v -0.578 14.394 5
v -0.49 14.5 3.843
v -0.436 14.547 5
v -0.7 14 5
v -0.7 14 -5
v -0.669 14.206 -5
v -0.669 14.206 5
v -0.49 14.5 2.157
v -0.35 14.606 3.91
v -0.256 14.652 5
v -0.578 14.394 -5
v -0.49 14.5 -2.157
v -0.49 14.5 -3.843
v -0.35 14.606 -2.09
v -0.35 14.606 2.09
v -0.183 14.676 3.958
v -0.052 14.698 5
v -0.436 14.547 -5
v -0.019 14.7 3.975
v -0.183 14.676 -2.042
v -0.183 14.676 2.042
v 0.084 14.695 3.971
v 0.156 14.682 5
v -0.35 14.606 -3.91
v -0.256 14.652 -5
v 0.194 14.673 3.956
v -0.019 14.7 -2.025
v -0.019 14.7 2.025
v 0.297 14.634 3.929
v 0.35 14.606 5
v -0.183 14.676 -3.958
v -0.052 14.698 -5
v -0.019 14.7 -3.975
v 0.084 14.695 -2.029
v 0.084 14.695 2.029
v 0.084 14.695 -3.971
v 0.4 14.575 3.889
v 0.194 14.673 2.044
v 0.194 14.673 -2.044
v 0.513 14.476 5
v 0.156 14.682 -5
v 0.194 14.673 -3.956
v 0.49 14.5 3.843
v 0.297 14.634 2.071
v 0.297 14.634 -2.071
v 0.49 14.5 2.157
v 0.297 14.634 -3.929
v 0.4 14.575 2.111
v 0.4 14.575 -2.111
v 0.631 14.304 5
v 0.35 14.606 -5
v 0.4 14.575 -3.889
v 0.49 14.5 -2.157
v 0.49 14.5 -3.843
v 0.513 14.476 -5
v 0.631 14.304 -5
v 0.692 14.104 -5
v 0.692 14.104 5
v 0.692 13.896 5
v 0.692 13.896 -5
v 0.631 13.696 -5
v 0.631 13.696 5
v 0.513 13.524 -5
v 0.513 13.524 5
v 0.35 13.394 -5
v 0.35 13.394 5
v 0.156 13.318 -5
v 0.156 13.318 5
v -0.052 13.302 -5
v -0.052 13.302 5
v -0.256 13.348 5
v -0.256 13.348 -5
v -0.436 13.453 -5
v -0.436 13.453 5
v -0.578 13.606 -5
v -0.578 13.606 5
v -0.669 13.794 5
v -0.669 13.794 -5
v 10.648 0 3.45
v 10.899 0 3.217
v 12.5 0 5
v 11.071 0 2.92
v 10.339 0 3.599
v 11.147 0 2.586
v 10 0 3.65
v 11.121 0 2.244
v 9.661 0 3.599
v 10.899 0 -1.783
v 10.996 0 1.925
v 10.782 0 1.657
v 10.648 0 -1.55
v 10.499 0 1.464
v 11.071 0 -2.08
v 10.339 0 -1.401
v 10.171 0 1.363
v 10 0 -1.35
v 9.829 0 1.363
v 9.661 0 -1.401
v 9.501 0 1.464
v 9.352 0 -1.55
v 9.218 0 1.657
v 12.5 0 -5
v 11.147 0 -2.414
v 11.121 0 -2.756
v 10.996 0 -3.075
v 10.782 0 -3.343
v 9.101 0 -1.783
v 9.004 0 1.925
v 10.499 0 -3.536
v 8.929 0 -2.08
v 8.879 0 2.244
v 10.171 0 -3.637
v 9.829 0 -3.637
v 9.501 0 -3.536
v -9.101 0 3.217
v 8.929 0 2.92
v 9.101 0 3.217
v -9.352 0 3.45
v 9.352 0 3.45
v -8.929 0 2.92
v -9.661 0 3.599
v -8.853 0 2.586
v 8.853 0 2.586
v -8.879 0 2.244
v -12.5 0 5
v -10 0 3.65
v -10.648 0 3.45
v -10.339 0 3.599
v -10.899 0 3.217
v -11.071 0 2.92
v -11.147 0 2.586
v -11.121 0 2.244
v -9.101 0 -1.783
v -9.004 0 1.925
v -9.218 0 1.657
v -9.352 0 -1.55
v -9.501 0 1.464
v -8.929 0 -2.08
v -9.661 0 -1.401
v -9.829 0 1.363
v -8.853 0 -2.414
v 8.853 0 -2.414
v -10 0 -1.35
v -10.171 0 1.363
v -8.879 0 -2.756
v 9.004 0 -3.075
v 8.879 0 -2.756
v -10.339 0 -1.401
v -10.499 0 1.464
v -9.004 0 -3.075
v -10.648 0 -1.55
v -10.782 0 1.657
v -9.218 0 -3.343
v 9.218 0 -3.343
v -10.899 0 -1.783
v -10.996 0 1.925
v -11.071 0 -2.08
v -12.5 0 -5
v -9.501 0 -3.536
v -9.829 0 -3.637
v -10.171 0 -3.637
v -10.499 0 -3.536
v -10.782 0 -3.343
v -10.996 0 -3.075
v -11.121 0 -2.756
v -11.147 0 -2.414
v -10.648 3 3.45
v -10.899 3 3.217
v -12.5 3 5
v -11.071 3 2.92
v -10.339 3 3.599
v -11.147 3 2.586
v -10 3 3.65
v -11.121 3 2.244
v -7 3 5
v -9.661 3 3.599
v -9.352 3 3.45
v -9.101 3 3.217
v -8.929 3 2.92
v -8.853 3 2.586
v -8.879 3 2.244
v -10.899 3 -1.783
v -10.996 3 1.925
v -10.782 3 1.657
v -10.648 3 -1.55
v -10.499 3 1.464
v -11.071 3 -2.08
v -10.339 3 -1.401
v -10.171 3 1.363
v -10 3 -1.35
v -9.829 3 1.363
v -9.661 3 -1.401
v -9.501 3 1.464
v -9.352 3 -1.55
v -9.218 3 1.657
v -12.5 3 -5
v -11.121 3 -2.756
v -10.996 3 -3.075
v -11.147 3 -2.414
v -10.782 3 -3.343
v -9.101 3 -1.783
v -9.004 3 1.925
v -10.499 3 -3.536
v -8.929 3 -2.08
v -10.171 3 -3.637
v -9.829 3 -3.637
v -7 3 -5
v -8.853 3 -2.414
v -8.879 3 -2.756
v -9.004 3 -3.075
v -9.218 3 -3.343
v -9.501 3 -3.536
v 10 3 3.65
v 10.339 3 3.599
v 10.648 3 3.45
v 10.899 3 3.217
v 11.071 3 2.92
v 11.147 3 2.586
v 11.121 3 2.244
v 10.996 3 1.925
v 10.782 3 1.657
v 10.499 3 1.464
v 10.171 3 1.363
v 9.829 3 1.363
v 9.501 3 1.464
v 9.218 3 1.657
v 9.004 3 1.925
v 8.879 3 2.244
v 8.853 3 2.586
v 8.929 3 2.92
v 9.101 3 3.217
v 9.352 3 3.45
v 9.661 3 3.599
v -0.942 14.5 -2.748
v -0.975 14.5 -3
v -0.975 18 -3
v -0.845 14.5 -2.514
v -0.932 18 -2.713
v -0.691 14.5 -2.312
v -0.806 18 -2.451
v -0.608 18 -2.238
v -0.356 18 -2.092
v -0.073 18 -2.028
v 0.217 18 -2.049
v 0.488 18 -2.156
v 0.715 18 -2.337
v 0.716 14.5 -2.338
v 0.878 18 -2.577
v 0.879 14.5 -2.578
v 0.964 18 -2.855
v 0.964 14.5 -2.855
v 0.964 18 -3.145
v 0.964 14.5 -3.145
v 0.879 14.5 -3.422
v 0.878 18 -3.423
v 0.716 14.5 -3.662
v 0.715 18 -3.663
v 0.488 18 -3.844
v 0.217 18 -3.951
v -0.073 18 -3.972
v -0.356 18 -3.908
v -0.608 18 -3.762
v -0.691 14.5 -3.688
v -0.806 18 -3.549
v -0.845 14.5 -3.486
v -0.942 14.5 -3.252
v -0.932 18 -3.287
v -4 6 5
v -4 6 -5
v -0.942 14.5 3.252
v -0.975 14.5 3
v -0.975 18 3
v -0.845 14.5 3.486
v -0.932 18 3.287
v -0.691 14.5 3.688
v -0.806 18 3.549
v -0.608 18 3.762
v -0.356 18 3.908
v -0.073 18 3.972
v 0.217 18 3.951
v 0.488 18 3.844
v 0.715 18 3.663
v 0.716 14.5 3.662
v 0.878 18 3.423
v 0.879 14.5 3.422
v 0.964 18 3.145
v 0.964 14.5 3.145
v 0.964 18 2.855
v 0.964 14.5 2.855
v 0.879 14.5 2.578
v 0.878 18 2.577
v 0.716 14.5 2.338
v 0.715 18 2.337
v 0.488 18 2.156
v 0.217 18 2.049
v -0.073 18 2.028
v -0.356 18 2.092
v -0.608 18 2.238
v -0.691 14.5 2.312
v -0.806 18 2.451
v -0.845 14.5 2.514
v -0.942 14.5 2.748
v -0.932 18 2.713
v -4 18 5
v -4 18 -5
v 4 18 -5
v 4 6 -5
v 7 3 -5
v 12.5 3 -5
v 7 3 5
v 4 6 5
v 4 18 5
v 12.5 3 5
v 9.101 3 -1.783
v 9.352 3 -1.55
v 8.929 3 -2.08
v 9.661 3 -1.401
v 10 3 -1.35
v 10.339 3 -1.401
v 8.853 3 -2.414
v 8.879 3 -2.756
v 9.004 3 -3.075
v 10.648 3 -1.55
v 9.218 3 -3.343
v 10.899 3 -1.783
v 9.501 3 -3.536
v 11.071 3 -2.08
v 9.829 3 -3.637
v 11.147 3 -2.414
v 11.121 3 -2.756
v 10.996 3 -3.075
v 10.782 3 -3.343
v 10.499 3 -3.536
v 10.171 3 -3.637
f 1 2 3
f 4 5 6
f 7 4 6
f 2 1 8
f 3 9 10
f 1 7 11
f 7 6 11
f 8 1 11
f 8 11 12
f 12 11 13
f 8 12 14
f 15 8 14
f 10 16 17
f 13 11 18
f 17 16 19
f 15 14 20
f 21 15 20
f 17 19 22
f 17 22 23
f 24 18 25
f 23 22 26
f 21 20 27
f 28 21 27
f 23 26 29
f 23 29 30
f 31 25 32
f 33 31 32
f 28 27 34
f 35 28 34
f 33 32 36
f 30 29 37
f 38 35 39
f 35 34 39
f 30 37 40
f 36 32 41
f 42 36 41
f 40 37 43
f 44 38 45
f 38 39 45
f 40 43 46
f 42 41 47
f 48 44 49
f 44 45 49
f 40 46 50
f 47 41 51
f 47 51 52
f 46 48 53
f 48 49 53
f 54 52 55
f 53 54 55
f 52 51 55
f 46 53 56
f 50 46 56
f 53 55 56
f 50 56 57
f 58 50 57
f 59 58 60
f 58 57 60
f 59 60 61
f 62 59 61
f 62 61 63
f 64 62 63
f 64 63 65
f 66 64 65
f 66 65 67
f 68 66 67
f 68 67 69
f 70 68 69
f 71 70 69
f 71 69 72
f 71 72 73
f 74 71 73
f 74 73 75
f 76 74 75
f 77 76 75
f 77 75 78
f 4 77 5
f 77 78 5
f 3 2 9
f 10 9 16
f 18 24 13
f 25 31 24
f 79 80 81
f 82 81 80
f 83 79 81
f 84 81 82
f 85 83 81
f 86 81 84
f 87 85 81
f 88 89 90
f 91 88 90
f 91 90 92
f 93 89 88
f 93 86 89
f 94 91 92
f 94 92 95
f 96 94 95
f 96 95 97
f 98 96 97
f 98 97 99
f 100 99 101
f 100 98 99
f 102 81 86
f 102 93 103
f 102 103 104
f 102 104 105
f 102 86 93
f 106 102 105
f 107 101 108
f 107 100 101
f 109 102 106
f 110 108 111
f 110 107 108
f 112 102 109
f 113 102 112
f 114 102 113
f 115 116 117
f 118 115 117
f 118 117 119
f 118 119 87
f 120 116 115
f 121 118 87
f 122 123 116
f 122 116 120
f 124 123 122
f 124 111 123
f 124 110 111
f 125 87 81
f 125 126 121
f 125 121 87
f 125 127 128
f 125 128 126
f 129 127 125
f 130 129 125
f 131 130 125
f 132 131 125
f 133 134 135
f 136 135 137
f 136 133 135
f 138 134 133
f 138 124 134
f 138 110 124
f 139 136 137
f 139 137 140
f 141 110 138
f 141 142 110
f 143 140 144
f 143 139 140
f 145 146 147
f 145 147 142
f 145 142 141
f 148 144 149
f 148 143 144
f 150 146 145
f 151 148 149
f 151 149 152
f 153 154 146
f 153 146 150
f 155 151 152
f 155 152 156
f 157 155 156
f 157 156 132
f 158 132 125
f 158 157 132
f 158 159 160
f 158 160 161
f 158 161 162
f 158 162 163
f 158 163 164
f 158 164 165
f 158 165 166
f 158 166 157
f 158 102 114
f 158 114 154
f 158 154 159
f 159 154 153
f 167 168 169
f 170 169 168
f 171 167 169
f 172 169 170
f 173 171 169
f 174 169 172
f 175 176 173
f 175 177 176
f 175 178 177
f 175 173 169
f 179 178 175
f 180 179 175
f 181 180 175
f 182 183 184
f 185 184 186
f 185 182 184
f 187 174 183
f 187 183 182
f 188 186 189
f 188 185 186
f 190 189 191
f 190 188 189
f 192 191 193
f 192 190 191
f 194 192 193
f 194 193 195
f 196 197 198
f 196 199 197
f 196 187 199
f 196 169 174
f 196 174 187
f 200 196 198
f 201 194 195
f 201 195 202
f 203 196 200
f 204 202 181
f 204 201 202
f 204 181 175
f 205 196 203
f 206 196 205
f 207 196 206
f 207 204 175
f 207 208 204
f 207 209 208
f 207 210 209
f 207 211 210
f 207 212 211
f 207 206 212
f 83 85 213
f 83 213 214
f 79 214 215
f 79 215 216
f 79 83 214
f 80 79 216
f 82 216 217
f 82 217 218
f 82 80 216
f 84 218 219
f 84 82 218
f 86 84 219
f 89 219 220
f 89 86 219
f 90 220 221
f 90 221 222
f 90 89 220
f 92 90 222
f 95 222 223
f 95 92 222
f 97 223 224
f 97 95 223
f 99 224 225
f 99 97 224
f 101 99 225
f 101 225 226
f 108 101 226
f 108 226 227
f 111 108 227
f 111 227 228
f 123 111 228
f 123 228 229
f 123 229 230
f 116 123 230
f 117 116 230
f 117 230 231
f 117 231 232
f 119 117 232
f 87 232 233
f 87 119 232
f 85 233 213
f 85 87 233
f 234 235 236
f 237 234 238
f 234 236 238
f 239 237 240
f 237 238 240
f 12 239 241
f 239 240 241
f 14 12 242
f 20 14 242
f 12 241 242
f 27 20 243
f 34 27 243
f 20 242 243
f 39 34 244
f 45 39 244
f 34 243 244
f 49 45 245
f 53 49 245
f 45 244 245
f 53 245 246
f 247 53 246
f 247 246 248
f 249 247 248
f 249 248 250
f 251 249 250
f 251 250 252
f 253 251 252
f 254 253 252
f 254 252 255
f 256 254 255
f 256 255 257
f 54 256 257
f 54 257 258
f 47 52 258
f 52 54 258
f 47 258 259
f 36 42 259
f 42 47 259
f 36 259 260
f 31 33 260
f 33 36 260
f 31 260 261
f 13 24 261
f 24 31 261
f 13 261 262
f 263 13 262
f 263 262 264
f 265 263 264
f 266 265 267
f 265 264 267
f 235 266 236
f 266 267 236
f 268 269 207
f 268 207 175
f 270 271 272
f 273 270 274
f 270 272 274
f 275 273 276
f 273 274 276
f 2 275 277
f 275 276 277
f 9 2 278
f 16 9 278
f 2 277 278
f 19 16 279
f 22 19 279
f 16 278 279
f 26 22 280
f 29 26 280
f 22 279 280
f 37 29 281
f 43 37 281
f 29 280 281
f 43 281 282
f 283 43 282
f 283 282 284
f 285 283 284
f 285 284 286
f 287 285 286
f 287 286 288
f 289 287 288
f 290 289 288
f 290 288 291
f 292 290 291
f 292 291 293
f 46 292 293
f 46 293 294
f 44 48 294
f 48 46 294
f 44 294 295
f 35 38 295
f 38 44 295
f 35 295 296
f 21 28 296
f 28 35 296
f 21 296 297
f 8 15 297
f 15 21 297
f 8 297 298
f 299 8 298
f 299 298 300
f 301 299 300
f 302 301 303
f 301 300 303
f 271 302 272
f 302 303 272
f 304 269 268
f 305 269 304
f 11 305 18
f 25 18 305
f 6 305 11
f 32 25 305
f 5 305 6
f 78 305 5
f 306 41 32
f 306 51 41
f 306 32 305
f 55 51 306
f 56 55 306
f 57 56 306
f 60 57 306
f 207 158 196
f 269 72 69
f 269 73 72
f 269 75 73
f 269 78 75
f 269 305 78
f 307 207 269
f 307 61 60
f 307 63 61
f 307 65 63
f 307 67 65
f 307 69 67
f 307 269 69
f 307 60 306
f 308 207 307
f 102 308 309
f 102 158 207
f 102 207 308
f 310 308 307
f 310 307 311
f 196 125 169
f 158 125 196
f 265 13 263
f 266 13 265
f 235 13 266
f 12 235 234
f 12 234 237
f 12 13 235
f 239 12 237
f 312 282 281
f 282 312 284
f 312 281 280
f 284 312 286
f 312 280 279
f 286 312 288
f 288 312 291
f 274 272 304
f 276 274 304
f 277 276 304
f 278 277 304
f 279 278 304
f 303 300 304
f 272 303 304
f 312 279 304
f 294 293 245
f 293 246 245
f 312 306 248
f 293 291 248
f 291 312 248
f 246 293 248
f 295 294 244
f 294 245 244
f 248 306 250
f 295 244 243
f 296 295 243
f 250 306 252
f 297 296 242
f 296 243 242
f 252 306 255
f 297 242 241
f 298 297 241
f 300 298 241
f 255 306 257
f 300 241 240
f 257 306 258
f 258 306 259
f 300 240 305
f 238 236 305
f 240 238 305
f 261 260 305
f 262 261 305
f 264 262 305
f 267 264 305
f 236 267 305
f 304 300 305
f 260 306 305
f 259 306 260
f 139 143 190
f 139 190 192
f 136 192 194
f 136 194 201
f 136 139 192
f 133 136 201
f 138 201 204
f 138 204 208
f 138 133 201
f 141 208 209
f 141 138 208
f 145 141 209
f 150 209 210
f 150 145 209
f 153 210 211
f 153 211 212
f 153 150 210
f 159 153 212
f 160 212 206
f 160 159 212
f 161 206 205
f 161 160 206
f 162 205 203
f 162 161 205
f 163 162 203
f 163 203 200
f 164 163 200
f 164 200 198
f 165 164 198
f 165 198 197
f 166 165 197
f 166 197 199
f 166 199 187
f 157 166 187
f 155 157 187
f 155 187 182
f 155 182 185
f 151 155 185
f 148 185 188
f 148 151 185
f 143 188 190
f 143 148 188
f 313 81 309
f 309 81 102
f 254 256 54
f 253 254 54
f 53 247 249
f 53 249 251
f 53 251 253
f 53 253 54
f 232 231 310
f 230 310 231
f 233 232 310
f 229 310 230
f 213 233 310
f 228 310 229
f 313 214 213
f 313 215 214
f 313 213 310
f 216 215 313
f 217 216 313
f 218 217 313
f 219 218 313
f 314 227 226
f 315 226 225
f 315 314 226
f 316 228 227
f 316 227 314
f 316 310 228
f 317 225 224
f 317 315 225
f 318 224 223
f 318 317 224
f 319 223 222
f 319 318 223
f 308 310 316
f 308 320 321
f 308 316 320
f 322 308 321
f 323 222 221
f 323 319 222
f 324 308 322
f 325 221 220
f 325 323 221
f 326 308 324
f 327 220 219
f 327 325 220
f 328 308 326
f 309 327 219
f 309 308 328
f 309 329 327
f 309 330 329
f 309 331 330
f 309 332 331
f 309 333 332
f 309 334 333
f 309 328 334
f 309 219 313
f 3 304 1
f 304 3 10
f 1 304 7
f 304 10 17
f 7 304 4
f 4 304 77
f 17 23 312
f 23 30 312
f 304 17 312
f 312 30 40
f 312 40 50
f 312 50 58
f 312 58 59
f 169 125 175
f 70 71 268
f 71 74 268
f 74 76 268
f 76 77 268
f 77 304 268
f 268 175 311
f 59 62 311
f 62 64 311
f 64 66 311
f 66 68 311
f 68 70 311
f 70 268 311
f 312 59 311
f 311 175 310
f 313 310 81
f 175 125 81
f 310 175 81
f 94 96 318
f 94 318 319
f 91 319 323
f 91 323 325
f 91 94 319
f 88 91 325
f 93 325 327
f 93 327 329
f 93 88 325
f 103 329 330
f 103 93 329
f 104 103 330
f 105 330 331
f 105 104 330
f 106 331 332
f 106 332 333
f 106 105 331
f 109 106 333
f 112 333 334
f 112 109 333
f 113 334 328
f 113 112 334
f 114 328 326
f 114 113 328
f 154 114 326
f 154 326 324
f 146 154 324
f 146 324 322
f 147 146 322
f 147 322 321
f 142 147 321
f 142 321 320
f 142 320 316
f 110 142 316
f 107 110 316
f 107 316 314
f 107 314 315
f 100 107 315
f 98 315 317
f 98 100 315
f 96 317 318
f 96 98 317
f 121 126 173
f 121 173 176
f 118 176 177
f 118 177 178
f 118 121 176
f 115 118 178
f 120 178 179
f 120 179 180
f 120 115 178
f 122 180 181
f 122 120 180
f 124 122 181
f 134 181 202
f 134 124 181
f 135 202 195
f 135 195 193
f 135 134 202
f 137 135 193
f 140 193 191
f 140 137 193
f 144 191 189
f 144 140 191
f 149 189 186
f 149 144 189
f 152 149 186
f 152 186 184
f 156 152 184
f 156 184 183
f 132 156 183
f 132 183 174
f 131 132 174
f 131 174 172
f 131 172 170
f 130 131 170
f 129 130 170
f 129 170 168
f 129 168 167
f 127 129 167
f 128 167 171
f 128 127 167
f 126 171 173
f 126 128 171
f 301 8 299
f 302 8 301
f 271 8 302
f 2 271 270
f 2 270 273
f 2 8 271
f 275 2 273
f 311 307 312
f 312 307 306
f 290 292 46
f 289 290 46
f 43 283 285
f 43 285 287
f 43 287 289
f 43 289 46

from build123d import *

# Parameters (mm, degrees)
SKETCH1_W           = 25
SKETCH1_H           = 10
SKETCH1_R           = 1.15
BOSS_EXTRUDE1_DEPTH = 3
SKETCH3_W           = 8
SKETCH3_H           = 18
SKETCH3_R           = 0.7
BOSS_EXTRUDE2_DEPTH = 10
SKETCH5_R           = 0.975
CUT_EXTRUDE2_DEPTH  = 3.5
CHAMFER1_SIZE       = 3


with BuildPart() as part:
    # Sketch1 → Boss-Extrude1 (new body)
    with BuildSketch(Plane(origin=(0, 0, 0), x_dir=(1, 0, 0), z_dir=(0, 1, 0))):
        Rectangle(SKETCH1_W, SKETCH1_H)
        with Locations(Location((-10, 2.5, 0), (0, 0, 270))):
            Circle(SKETCH1_R, mode=Mode.SUBTRACT)
        with Locations(Location((-10, -2.5, 0), (0, 0, 270))):
            Circle(SKETCH1_R, mode=Mode.SUBTRACT)
        with Locations(Location((10, 2.5, 0), (0, 0, 270))):
            Circle(SKETCH1_R, mode=Mode.SUBTRACT)
        with Locations(Location((10, -2.5, 0), (0, 0, 270))):
            Circle(SKETCH1_R, mode=Mode.SUBTRACT)
    extrude(amount=BOSS_EXTRUDE1_DEPTH)

    # Sketch3 → Boss-Extrude2 (add)
    with BuildSketch(Plane(origin=(0, 0, -5), x_dir=(-1, 0, 0), z_dir=(0, 0, -1))):
        with Locations((0, 9)):
            Rectangle(SKETCH3_W, SKETCH3_H)
        with Locations((0, 14)):
            Circle(SKETCH3_R, mode=Mode.SUBTRACT)
    extrude(amount=-BOSS_EXTRUDE2_DEPTH)

    # Sketch5 → Cut-Extrude2 (cut)
    with BuildSketch(Plane(origin=(0, 18, 0), x_dir=(1, 0, 0), z_dir=(0, 1, 0))):
        with Locations(Location((0, 3, 0), (0, 0, 180))):
            Circle(SKETCH5_R)
        with Locations(Location((0, -3, 0), (0, 0, 180))):
            Circle(SKETCH5_R)
    extrude(amount=-CUT_EXTRUDE2_DEPTH, mode=Mode.SUBTRACT)

    # Chamfer1
    chamfer1_edges = [part.edges().sort_by_distance(p)[0] for p in [
        (-4, 3, 0),
        (4, 3, 0),
    ]]
    chamfer(chamfer1_edges, length=CHAMFER1_SIZE)


solid = part.part
